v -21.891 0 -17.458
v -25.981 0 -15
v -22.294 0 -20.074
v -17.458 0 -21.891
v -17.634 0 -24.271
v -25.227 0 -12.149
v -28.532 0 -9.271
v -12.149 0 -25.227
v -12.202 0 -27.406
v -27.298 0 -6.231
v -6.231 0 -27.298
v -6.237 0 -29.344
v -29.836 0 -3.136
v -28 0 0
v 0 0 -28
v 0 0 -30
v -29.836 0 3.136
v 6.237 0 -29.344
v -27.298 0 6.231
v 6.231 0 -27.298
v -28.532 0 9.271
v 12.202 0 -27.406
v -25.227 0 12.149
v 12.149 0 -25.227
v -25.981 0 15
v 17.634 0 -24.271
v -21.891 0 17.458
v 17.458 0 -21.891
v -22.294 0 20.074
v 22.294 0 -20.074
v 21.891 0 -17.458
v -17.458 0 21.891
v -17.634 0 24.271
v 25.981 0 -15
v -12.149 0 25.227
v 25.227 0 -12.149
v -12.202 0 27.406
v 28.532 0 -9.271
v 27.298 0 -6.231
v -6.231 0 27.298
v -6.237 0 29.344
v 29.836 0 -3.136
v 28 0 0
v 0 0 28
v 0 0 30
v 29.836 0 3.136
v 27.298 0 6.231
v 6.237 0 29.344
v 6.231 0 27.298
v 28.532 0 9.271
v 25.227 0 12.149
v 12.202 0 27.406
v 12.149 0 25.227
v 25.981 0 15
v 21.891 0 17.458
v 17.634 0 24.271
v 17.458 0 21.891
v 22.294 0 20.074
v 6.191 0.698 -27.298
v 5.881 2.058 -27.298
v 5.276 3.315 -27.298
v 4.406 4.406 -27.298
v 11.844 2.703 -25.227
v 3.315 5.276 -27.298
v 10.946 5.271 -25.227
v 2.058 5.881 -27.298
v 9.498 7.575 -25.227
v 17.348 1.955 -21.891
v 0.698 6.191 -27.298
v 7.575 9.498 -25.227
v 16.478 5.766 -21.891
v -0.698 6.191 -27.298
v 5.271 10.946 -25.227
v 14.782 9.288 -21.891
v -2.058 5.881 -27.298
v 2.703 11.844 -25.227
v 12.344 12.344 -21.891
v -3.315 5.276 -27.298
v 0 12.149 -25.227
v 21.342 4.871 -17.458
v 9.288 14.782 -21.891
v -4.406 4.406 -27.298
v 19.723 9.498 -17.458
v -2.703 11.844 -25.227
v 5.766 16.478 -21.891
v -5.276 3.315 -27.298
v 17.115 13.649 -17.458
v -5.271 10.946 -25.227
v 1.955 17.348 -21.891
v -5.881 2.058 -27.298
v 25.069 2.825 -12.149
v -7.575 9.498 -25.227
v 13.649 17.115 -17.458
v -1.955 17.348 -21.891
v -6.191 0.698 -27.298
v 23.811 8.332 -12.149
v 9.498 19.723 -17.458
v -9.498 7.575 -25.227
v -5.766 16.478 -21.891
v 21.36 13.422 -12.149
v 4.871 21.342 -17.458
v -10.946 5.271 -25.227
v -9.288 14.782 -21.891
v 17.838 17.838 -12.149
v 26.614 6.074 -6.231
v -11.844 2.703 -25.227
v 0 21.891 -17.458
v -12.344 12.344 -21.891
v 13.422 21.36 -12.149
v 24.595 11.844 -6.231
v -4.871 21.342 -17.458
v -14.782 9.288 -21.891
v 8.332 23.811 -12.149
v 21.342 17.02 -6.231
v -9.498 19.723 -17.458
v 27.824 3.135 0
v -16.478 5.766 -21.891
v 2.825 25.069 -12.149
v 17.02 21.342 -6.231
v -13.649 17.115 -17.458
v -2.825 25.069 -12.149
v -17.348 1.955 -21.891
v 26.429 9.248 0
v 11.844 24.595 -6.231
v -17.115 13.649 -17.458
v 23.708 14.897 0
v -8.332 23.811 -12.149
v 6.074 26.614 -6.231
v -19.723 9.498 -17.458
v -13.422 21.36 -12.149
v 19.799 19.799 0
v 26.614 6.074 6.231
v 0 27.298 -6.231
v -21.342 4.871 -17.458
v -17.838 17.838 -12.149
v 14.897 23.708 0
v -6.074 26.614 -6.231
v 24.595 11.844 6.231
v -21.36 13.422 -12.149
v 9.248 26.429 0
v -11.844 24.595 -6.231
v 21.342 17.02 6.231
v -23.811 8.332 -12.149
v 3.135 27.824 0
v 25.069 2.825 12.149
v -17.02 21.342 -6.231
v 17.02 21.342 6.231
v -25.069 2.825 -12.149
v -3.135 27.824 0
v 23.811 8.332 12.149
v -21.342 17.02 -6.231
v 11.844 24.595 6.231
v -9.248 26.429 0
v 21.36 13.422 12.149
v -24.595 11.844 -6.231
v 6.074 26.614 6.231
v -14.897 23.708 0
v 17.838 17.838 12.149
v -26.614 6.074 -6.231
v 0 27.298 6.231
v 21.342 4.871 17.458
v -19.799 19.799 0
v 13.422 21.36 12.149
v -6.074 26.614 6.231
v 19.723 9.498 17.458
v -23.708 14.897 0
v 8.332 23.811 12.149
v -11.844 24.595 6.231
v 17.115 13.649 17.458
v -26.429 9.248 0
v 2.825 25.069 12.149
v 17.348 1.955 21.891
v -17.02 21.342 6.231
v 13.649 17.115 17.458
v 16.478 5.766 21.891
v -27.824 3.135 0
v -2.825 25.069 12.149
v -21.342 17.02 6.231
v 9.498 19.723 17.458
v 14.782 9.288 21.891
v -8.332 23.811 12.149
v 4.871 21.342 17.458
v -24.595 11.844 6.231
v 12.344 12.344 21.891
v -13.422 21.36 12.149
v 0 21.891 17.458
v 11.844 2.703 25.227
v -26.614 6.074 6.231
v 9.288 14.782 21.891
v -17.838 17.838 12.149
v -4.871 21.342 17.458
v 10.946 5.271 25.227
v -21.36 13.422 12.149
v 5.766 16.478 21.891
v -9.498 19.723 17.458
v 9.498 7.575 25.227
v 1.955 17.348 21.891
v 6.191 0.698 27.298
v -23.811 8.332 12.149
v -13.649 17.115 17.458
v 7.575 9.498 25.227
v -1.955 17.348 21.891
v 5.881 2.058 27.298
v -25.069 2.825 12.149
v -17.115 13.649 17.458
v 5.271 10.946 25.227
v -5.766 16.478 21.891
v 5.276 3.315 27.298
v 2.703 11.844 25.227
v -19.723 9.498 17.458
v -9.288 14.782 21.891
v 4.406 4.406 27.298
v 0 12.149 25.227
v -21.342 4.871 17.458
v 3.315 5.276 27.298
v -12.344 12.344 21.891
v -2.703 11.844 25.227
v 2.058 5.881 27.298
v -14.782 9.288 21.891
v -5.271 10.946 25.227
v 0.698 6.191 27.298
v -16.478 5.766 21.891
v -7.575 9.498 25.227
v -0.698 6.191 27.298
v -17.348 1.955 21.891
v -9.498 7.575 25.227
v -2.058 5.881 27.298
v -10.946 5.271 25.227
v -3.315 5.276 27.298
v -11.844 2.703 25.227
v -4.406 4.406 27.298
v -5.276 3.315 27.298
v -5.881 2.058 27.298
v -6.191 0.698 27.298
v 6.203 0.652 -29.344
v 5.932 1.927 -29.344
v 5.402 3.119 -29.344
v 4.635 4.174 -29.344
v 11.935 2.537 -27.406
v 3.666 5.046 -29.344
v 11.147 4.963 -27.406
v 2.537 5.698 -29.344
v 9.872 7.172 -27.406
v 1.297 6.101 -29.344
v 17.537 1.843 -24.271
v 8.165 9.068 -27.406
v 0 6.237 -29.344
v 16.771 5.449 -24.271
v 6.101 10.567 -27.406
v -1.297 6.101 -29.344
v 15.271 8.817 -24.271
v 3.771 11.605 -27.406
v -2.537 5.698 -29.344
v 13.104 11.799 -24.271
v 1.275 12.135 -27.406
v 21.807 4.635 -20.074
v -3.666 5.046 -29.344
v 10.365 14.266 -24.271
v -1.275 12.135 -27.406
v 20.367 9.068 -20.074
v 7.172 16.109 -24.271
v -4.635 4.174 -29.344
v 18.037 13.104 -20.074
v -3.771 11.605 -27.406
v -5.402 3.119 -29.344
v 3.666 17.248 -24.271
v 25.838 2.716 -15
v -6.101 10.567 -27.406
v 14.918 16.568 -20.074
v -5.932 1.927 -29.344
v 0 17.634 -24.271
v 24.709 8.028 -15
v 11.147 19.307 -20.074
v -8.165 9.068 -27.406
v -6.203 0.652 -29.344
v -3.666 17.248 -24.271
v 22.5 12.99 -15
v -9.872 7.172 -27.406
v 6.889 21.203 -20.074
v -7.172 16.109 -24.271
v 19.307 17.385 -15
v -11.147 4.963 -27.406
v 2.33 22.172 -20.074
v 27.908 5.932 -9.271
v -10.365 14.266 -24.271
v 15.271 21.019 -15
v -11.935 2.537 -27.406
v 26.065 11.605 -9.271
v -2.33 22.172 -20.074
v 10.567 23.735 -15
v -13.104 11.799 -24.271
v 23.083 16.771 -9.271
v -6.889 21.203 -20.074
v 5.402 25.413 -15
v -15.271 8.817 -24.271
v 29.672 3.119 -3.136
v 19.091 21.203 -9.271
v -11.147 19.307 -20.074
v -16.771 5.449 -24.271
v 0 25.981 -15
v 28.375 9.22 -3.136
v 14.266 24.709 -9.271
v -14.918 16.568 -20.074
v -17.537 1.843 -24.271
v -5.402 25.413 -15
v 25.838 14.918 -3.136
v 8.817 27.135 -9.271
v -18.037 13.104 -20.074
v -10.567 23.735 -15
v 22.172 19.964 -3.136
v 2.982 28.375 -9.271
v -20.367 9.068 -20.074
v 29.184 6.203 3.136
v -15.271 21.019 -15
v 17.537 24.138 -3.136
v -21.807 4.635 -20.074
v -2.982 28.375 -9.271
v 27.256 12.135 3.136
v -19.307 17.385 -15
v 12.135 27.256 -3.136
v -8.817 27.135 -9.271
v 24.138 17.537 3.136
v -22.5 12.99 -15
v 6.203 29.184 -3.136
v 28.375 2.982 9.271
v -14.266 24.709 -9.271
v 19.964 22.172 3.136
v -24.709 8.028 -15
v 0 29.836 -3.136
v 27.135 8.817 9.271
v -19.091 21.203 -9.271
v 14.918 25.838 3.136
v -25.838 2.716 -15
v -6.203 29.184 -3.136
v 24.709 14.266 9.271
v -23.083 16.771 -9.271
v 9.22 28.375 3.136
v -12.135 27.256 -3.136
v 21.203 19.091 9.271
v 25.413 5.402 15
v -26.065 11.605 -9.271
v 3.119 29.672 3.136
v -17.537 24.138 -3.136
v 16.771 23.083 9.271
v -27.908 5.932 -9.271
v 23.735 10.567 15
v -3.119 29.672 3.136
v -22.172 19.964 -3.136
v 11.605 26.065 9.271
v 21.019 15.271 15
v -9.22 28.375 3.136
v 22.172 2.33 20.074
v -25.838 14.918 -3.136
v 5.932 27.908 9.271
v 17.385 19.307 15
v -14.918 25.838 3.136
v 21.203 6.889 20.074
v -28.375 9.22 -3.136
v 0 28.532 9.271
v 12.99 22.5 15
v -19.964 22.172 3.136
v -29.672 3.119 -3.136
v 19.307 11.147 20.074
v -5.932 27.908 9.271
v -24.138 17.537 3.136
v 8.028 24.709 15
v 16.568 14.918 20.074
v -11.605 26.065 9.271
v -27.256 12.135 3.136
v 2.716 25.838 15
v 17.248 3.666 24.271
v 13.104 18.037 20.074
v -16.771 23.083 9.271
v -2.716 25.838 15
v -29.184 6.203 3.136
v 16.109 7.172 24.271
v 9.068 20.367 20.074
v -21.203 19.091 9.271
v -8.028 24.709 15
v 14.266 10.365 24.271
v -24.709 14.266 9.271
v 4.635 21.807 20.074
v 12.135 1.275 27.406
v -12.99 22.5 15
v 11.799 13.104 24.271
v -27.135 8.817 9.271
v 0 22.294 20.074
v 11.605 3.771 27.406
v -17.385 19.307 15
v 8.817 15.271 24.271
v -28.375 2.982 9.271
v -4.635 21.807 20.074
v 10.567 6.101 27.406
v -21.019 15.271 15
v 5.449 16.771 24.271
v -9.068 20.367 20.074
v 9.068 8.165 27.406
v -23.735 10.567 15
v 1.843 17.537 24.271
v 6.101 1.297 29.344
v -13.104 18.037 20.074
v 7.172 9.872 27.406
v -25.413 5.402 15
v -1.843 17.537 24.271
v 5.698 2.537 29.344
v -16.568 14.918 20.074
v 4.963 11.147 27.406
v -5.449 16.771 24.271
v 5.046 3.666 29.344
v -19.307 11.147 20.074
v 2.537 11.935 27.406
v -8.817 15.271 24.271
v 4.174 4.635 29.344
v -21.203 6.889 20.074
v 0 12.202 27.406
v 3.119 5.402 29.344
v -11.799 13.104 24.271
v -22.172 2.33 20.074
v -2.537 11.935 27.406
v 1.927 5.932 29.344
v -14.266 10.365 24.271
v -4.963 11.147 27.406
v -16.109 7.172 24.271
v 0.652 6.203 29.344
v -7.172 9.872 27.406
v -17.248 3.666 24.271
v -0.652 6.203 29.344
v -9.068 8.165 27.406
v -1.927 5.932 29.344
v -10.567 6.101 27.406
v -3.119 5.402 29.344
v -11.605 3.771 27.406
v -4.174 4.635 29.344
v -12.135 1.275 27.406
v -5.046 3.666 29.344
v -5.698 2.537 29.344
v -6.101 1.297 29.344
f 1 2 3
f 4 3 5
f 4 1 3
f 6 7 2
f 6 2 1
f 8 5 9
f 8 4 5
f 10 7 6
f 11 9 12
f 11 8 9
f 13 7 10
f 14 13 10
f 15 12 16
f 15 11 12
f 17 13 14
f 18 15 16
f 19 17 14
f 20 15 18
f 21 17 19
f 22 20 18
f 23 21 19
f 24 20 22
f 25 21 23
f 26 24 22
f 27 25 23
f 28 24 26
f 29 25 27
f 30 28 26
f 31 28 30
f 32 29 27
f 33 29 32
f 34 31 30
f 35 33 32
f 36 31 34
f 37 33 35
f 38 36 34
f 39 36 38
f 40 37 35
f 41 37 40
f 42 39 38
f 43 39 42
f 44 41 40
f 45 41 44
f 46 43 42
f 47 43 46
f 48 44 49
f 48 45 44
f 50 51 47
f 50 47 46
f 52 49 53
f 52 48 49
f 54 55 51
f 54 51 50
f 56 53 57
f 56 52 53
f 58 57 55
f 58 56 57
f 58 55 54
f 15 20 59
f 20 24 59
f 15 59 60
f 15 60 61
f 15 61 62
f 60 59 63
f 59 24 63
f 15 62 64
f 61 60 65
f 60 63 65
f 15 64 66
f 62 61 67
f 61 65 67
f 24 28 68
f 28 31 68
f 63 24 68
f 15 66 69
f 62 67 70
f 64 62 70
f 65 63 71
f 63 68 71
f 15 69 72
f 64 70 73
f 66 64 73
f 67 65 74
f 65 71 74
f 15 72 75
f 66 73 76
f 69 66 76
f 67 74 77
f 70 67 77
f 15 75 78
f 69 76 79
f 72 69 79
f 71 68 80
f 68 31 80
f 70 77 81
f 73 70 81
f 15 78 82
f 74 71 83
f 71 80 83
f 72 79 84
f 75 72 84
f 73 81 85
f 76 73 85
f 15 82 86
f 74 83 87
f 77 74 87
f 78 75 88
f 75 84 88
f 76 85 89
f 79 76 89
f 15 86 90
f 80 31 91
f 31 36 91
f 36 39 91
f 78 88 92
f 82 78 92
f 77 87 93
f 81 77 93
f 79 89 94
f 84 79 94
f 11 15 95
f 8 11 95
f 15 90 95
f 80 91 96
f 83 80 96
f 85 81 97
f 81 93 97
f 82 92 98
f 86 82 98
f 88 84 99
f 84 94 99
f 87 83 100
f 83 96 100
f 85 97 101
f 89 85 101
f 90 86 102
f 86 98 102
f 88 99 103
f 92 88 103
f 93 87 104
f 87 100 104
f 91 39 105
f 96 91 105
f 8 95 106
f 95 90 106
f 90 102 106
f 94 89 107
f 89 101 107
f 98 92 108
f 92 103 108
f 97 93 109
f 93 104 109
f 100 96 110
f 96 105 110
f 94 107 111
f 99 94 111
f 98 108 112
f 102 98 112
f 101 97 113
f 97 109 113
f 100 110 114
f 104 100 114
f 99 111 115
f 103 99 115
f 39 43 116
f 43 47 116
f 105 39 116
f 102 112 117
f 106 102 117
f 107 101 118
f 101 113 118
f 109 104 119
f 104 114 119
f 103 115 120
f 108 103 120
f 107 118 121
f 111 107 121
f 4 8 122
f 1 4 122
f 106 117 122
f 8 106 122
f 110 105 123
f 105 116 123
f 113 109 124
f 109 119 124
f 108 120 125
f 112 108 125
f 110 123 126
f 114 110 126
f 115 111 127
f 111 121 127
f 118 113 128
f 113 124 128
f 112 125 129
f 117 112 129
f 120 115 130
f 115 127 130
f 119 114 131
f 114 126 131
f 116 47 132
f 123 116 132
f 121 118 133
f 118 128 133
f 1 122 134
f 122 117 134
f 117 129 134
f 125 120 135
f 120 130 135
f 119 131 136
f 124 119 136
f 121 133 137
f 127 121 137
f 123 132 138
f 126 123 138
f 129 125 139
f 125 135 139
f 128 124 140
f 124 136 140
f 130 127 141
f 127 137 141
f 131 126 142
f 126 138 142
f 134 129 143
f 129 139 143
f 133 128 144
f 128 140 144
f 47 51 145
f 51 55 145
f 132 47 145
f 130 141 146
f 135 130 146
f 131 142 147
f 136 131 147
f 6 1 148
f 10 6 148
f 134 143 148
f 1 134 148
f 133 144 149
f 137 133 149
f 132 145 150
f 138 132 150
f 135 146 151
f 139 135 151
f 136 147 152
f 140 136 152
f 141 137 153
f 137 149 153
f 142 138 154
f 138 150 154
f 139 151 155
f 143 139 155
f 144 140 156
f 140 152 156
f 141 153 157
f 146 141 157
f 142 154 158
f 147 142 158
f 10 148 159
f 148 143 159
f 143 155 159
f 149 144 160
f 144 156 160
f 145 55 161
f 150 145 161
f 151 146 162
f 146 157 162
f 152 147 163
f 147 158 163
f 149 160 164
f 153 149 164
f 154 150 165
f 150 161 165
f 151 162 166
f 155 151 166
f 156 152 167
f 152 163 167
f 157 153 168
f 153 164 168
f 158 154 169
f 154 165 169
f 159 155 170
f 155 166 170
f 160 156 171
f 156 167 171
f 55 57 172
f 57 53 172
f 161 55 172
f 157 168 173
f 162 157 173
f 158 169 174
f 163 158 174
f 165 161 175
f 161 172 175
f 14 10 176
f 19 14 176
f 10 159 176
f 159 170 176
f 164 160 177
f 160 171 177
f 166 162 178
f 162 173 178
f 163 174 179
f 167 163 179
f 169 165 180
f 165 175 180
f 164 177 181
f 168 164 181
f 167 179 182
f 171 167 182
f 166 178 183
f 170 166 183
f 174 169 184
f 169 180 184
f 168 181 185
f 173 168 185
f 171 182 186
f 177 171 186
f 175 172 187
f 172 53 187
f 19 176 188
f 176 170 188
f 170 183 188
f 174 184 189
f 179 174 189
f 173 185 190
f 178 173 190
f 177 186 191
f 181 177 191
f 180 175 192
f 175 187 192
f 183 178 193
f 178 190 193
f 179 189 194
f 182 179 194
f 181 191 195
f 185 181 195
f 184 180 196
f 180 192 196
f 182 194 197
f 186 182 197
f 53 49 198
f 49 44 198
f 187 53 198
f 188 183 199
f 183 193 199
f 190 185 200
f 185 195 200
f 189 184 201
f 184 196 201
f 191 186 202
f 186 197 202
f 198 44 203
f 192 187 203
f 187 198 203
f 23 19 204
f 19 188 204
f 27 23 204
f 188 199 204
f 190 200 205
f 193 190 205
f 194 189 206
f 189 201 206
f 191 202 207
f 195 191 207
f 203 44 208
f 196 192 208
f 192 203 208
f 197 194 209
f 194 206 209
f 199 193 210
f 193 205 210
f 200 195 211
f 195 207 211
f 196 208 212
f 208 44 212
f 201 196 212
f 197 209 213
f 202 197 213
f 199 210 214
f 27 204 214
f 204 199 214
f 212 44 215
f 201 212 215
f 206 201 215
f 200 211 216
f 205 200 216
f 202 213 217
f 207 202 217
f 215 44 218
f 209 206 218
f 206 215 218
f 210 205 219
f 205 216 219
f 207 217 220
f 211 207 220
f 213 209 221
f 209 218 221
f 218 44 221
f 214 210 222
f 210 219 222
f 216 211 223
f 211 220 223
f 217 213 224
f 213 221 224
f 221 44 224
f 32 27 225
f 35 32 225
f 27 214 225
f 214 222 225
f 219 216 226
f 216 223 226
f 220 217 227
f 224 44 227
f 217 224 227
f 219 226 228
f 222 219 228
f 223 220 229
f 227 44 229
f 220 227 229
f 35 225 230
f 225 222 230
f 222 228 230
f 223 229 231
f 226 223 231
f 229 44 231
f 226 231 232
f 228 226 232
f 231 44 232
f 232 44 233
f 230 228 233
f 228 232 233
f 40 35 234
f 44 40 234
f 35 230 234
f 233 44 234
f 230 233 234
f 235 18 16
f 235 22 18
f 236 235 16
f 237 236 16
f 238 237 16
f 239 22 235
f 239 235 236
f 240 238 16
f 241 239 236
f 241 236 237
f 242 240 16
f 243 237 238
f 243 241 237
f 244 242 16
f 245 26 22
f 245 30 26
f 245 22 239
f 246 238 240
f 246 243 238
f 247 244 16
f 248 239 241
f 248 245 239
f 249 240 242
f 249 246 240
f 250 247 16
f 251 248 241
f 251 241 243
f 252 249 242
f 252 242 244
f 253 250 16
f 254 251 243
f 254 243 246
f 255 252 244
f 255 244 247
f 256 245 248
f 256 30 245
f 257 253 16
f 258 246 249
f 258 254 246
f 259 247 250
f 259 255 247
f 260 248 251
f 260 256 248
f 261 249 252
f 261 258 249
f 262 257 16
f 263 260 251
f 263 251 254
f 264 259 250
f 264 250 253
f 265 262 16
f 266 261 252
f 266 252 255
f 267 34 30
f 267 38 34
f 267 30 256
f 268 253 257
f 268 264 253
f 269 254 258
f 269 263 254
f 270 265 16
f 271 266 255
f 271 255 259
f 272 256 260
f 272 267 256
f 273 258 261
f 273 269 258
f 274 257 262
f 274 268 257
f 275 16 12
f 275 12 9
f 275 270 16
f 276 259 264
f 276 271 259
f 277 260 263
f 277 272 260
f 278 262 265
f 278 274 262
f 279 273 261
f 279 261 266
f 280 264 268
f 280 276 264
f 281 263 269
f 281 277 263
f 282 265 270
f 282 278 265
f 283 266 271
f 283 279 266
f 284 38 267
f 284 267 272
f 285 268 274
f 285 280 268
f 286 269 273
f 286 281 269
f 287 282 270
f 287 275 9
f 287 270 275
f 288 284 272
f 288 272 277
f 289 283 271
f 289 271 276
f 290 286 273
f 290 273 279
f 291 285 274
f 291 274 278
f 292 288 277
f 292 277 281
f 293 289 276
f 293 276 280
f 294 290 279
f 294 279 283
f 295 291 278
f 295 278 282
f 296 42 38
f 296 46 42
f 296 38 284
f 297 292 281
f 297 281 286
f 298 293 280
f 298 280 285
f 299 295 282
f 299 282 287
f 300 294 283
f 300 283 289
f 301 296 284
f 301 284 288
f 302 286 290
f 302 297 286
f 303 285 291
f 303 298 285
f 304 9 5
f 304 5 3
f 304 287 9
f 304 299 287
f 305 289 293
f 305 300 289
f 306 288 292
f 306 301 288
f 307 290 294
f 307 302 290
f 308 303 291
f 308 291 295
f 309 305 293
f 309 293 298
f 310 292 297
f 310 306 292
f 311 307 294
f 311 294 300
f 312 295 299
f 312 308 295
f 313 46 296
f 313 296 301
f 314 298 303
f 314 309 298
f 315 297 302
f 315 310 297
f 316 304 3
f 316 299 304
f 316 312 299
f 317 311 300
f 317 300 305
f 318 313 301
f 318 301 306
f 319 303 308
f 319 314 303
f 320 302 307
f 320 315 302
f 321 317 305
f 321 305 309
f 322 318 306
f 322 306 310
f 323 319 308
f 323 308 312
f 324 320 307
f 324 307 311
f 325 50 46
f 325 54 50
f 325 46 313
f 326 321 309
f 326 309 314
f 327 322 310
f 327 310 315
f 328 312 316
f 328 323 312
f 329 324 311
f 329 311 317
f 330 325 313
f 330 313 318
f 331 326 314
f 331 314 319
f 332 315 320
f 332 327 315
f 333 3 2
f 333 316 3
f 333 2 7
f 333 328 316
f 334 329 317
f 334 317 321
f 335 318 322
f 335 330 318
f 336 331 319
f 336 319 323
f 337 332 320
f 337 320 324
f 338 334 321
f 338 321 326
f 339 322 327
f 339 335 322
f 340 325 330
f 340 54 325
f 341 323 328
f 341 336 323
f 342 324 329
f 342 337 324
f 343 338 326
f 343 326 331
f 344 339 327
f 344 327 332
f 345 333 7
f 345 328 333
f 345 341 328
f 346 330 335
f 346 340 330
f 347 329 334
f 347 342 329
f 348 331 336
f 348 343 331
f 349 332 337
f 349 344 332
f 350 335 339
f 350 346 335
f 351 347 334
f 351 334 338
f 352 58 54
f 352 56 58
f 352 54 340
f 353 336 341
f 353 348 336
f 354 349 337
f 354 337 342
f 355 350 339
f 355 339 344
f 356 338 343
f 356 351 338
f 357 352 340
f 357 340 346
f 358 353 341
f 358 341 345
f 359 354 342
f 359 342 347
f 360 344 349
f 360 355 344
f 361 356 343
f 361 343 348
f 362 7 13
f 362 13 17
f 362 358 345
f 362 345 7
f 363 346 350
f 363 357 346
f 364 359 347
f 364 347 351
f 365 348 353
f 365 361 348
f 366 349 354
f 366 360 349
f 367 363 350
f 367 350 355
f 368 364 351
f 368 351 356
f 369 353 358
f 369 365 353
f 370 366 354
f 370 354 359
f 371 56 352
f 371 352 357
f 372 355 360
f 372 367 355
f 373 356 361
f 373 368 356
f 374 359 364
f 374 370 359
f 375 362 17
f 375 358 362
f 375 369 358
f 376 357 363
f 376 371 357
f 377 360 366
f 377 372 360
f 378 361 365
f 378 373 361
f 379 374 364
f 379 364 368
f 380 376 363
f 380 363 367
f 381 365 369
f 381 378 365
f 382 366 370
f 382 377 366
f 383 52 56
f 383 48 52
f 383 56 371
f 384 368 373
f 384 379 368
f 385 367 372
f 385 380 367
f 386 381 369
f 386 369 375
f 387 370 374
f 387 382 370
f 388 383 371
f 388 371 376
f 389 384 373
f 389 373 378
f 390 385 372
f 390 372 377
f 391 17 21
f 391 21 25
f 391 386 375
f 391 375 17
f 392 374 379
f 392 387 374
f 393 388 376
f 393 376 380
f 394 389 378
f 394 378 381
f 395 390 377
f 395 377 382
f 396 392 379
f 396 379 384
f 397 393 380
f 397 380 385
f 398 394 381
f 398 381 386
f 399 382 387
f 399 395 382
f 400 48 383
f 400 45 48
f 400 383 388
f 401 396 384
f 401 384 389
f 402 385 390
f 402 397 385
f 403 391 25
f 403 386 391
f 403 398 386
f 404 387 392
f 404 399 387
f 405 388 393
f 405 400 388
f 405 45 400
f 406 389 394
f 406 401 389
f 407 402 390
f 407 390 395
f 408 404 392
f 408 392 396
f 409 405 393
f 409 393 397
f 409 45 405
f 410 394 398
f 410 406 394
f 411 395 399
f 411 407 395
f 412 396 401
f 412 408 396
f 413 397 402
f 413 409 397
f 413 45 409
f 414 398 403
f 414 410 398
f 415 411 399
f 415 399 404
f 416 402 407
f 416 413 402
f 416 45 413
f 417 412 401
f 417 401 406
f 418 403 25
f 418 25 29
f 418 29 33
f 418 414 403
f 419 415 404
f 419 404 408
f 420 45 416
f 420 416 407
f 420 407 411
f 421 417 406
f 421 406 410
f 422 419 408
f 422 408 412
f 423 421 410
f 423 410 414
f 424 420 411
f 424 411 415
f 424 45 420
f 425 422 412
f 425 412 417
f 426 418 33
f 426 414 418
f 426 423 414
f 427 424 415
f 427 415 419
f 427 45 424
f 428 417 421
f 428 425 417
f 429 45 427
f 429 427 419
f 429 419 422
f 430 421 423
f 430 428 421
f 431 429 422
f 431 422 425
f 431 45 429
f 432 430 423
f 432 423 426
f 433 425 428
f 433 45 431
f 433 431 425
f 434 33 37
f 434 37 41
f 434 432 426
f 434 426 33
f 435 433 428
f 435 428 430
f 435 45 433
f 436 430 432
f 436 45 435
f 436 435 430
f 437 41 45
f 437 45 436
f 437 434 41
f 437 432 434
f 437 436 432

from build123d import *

# Parameters (mm, degrees)
SPHERE001_ANGLE = 180
SPHERE_ANGLE    = 180


with BuildPart() as inner:
    # Sphere001 → Sphere001 (revolve)
    with BuildSketch(Plane.XZ):
        with BuildLine():
            ThreePointArc((0, -28), (28, 0), (0, 28))
            Line((0, 28), (0, -28))
        make_face()
    revolve(axis=Axis((0, 0, 0), (0, 0, 1)), revolution_arc=SPHERE001_ANGLE)


with BuildPart() as cut:
    # Sphere → Sphere (revolve)
    with BuildSketch(Plane.XZ):
        with BuildLine():
            ThreePointArc((0, -30), (30, 0), (0, 30))
            Line((0, 30), (0, -30))
        make_face()
    revolve(axis=Axis((0, 0, 0), (0, 0, 1)), revolution_arc=SPHERE_ANGLE)

    # Cut: cut Inner
    add(inner.part, mode=Mode.SUBTRACT)


solid = cut.part
